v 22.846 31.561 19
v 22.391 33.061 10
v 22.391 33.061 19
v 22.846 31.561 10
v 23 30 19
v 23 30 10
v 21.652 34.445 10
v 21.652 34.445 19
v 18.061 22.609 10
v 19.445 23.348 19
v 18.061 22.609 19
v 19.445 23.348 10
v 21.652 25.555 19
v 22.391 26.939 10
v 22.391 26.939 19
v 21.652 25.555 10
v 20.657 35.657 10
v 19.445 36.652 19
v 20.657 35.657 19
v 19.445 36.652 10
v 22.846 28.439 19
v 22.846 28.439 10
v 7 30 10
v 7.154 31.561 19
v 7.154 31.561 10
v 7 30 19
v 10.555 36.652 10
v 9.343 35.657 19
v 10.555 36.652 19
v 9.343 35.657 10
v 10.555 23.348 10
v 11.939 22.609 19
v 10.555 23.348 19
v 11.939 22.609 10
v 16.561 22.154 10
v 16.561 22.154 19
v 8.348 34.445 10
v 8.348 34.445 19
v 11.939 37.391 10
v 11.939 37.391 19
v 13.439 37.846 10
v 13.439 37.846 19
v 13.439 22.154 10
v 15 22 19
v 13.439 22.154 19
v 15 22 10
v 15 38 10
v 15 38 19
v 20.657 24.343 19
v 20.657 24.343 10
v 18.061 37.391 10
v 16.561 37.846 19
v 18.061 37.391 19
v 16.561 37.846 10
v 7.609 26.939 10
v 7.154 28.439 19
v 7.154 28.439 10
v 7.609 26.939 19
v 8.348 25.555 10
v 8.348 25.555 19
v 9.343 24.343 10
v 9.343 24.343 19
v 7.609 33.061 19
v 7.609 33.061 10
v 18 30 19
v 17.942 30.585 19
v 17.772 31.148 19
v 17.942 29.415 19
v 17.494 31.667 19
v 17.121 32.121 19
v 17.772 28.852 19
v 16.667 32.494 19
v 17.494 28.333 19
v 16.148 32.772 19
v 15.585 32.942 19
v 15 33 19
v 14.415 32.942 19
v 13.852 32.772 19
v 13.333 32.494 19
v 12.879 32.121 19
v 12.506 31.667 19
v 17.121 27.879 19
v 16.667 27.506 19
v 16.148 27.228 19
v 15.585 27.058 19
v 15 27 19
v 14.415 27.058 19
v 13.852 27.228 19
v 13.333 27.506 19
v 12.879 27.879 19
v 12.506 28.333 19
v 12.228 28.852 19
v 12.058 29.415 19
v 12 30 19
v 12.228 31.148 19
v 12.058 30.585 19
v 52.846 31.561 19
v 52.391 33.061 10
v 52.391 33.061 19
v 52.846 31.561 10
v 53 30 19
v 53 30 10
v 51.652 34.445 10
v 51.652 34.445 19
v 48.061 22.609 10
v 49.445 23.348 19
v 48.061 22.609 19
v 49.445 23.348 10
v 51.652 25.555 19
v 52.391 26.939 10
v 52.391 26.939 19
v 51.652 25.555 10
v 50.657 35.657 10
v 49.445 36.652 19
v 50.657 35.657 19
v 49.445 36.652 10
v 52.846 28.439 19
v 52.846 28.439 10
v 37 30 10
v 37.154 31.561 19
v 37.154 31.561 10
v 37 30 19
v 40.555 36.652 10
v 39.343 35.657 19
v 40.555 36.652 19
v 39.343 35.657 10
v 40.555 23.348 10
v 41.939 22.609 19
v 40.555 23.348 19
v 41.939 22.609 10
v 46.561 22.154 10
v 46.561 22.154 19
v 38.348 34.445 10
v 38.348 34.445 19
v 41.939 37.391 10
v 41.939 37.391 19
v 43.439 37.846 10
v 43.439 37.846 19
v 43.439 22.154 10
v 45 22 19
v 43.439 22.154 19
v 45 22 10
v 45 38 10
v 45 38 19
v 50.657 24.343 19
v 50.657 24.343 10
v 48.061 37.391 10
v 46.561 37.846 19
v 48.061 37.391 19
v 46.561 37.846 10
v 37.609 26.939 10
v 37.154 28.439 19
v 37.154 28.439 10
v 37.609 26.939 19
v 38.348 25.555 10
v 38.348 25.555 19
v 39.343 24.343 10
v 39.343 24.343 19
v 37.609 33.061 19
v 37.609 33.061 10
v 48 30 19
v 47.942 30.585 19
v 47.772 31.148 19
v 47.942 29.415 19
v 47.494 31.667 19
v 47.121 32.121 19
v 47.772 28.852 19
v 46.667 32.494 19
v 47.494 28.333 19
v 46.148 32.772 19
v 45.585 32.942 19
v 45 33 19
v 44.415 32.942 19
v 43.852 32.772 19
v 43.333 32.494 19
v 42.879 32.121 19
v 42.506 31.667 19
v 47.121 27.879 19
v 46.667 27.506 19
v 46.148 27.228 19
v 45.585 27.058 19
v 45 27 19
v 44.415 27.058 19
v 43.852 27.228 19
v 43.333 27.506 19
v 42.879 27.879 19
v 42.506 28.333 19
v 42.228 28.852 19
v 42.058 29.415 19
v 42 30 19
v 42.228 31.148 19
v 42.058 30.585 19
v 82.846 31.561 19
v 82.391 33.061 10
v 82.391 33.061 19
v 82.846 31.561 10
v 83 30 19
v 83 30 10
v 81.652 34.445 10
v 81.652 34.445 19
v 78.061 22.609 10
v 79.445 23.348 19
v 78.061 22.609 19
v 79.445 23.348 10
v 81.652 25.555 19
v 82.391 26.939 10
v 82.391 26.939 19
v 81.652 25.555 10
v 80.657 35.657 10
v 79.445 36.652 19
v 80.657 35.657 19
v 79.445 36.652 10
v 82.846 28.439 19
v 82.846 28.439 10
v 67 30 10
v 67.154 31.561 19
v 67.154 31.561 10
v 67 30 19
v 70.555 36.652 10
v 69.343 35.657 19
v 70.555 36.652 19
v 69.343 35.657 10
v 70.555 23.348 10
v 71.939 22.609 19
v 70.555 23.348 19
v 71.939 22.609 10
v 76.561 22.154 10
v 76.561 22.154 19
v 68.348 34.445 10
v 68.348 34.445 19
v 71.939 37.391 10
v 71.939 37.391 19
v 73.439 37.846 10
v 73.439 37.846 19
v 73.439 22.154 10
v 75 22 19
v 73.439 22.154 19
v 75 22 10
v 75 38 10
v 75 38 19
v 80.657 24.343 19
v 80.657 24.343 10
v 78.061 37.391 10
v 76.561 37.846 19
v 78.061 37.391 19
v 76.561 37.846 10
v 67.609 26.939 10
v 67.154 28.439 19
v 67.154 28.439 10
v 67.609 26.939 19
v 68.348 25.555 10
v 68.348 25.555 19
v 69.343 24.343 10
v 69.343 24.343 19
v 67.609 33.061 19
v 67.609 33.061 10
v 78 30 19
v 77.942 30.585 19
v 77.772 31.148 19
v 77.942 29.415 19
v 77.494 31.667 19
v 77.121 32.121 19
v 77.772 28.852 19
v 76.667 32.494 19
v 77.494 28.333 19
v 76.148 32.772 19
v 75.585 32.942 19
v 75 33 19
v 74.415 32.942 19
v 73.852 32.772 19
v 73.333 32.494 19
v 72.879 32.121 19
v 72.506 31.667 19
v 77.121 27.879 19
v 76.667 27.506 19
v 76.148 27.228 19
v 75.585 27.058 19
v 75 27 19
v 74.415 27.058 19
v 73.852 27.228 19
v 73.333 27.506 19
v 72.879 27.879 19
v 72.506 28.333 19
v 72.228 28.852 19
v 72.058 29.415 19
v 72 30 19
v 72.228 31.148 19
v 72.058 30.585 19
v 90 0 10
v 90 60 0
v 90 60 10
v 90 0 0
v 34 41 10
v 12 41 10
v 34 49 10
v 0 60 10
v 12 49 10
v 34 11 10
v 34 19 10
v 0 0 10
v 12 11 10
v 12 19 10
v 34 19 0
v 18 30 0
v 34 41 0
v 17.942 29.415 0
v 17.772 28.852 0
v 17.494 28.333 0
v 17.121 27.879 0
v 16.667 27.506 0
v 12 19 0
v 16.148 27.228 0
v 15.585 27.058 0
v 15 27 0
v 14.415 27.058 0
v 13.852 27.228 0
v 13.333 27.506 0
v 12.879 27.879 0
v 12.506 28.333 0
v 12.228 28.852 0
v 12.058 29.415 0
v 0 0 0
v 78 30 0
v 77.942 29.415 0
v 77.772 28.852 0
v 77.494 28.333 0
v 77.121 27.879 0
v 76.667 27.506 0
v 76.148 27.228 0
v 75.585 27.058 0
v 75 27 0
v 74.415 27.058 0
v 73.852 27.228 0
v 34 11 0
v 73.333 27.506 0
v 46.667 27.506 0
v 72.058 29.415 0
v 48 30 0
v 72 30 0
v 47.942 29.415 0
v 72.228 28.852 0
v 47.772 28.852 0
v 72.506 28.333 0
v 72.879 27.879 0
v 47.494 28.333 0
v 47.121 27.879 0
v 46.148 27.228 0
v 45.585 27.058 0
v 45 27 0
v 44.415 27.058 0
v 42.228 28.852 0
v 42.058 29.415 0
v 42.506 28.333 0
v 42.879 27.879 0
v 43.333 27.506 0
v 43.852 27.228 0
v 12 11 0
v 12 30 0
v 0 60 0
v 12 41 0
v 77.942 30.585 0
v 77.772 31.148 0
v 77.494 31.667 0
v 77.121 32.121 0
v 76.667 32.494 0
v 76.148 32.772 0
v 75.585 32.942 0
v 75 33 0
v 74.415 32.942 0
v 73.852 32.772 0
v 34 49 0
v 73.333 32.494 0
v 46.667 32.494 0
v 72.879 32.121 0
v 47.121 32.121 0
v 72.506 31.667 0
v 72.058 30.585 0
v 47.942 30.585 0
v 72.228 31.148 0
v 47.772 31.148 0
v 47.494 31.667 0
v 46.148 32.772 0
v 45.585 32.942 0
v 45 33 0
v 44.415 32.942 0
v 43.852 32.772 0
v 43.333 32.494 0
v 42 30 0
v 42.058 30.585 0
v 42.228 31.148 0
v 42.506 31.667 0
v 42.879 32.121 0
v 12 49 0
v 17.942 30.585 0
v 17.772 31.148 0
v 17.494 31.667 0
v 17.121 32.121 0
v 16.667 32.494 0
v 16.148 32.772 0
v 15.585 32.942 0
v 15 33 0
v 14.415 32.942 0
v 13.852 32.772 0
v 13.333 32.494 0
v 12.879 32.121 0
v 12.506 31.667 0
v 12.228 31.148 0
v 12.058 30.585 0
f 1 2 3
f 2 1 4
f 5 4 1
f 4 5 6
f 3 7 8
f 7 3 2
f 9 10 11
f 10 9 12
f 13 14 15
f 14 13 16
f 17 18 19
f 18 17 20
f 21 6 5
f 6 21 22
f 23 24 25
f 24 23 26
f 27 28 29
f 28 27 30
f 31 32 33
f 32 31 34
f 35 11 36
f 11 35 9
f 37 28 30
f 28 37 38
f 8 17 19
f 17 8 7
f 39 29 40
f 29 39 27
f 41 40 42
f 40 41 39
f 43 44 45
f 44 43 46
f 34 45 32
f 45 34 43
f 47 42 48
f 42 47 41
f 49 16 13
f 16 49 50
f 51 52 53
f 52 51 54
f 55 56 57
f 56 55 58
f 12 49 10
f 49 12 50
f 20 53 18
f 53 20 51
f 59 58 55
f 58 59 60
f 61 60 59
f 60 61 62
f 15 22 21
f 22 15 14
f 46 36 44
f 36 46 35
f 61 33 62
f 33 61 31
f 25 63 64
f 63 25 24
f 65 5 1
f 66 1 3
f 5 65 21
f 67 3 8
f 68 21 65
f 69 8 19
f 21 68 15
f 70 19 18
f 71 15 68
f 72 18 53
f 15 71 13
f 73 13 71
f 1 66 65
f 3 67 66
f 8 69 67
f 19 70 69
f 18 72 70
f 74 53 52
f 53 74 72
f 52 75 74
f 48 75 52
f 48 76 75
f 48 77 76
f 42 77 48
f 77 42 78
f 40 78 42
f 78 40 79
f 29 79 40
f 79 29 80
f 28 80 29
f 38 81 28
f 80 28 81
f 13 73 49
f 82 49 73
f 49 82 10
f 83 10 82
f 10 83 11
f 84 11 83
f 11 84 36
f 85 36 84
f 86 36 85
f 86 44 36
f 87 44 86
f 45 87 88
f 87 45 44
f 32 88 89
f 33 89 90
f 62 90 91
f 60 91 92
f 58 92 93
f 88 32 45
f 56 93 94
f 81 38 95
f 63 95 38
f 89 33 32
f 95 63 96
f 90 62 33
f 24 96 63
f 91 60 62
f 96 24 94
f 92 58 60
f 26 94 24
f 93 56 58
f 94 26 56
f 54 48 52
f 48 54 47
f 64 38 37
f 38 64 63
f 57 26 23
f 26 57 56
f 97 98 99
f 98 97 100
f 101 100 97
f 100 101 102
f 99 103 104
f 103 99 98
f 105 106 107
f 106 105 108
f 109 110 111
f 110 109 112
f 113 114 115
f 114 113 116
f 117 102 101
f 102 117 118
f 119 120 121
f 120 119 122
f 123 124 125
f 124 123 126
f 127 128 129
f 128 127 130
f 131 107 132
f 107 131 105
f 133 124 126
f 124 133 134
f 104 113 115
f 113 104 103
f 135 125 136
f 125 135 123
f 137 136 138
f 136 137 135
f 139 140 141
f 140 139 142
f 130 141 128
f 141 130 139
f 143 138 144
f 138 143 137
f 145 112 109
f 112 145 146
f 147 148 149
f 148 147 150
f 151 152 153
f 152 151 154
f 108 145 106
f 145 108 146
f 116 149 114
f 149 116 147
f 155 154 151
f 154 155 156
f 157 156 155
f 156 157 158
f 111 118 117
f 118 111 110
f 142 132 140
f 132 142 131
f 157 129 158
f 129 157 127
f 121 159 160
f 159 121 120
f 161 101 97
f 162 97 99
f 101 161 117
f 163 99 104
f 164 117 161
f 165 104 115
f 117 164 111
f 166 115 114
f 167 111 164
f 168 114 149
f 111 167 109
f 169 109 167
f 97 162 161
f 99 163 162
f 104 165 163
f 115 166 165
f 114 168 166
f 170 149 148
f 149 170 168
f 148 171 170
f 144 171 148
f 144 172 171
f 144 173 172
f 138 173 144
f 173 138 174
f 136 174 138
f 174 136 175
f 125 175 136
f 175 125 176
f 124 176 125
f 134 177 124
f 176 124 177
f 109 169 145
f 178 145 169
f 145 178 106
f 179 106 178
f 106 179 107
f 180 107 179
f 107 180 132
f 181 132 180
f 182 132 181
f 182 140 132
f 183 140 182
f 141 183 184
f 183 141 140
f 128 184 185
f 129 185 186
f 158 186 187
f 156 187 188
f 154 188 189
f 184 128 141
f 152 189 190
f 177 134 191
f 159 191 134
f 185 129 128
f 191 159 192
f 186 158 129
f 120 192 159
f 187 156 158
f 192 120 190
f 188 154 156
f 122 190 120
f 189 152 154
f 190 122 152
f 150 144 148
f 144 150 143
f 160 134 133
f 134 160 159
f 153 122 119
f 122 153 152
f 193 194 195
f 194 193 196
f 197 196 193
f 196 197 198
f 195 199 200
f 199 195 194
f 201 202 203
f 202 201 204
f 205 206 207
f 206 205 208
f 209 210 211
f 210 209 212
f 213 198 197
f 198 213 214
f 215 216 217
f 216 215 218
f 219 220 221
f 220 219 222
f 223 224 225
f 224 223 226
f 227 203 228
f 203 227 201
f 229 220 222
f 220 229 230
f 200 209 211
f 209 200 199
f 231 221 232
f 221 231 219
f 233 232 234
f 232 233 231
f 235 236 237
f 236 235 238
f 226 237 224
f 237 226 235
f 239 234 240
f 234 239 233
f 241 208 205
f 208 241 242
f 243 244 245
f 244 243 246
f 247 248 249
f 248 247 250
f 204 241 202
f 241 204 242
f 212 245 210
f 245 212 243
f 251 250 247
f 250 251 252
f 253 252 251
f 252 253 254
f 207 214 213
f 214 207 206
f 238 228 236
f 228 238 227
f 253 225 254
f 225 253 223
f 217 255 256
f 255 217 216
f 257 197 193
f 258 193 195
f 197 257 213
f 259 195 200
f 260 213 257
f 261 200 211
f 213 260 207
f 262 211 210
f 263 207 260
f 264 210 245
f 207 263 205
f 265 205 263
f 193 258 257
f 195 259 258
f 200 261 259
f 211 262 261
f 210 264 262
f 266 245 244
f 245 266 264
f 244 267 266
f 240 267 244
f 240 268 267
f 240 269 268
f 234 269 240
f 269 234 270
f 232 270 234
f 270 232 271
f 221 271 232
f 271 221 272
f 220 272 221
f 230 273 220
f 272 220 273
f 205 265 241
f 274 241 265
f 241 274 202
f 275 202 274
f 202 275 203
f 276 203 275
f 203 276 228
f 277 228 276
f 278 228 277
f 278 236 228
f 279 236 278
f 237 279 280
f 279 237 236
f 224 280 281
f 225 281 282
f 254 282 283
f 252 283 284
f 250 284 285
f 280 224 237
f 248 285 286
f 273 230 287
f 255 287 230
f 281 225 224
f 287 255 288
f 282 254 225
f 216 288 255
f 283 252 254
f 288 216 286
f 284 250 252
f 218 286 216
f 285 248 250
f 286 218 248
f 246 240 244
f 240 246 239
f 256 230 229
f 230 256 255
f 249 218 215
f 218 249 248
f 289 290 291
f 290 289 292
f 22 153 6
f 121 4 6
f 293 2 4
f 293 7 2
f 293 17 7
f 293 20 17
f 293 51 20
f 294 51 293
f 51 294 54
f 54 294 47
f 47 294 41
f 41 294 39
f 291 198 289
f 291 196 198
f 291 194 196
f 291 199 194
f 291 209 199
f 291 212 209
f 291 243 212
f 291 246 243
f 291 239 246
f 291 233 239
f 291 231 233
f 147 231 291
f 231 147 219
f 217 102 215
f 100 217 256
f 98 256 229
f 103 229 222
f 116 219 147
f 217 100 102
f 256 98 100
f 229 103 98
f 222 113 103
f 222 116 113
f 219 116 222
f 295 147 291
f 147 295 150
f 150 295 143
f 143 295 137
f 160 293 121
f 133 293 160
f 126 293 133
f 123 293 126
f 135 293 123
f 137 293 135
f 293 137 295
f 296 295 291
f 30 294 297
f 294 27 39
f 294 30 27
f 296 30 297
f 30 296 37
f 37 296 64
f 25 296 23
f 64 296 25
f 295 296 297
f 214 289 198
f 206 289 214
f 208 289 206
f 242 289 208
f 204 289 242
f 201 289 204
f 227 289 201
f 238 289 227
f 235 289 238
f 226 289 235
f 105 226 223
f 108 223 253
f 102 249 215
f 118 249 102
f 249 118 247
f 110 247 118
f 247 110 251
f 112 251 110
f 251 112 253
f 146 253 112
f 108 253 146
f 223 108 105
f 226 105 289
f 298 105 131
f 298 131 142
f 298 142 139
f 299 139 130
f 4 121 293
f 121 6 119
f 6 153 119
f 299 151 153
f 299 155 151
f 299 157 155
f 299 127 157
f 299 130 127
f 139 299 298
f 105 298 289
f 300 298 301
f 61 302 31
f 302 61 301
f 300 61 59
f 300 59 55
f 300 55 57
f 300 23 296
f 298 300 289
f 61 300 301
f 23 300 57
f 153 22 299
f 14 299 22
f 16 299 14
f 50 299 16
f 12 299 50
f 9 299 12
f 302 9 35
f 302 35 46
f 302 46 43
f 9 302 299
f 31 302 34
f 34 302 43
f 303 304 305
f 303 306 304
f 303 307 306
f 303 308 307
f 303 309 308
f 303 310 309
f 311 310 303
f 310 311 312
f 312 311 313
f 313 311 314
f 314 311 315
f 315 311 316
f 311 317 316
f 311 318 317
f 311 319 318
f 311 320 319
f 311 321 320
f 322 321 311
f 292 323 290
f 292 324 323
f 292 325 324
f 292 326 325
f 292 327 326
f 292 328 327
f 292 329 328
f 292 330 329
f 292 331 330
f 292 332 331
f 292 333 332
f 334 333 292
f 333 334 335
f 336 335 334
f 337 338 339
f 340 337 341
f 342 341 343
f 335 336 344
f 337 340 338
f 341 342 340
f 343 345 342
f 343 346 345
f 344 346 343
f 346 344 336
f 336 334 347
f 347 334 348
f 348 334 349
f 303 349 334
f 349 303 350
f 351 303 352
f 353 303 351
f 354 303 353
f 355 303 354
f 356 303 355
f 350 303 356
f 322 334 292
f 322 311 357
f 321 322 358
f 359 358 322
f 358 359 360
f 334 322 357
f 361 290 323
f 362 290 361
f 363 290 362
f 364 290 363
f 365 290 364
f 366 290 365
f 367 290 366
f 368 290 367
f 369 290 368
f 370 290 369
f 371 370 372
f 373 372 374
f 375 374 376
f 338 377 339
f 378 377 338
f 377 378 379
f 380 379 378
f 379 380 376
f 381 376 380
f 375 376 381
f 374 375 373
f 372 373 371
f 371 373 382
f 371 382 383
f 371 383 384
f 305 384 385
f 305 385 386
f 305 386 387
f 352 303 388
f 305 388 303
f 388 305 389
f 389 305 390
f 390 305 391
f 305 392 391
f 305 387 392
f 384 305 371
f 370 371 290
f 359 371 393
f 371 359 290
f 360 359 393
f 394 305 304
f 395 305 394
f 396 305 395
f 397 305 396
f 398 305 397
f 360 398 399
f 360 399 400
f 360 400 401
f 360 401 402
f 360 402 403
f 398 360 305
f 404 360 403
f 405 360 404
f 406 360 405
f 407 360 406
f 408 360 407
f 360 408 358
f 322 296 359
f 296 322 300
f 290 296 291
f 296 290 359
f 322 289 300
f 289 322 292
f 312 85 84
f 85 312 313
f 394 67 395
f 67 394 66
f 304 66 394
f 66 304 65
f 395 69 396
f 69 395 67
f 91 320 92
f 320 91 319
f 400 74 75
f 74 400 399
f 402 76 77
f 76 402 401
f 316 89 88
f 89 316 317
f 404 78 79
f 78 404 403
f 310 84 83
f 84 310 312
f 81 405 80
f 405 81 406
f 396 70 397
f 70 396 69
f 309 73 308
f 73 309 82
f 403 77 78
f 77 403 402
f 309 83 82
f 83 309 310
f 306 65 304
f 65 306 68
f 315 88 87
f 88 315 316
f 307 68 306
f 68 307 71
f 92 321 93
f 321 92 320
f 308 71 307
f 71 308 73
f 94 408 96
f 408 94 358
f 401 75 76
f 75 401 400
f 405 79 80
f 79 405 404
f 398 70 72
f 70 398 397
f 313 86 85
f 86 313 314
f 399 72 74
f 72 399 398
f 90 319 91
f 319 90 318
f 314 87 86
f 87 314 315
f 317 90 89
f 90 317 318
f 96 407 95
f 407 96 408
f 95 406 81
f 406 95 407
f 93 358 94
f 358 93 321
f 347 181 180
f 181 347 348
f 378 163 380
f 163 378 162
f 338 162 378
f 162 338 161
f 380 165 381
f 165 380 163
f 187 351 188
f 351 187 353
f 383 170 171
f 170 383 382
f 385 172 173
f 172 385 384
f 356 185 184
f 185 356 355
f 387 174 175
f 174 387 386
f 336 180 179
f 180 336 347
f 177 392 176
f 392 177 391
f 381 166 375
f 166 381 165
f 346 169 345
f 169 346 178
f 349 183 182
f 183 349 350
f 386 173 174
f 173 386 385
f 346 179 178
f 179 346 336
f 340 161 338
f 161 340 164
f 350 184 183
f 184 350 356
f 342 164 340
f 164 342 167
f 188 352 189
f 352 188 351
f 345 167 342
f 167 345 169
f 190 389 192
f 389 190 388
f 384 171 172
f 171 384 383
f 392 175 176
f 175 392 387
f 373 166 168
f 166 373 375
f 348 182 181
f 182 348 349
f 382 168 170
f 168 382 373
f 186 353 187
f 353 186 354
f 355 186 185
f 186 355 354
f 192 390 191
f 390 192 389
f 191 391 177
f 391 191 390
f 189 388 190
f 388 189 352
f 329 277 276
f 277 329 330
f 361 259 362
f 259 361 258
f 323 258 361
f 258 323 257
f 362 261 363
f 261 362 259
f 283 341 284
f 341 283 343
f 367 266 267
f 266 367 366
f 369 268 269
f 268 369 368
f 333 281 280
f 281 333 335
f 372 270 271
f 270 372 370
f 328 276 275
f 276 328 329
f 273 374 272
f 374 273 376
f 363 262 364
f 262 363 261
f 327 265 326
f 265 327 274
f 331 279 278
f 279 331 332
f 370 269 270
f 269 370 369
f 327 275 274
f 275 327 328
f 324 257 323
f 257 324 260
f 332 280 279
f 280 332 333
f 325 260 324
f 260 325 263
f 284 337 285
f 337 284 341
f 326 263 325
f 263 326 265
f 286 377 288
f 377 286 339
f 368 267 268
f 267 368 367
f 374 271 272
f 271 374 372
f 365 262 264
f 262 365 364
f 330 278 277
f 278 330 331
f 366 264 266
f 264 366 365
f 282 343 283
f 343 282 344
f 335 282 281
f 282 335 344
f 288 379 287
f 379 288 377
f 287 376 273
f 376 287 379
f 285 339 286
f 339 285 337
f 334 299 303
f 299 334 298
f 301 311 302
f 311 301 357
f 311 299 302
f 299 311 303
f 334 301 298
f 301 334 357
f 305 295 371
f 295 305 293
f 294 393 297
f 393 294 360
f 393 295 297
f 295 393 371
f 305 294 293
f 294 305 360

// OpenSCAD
$fn = 32;

// ----------------------------------------------------------------------
// Drill jig: three_boss_slot jig
// ----------------------------------------------------------------------

// --- parameters (mm) ---
plate_l = 90;             // plate length, X
plate_w = 60;             // plate width, Y
plate_t = 10;             // plate thickness
boss_d = 16;              // guide boss diameter
boss_h = 10;              // boss height above the plate
guide_d = 6;              // guide hole diameter
boss_pitch = 30;          // boss pitch
slot_w = 8;               // clamp slot width
slot_l = 22;              // clamp slot length
slot_x = 12;              // slot start X

n_boss = 3;  // guide bosses
boss_x0 = (plate_l - (n_boss - 1) * boss_pitch) / 2;  // first boss X
boss_top = plate_t - 1 + boss_h;  // boss crown height
total_h = boss_top;  // overall height

difference() {
  union() {
  cube([plate_l, plate_w, plate_t]);
  for (i = [0 : n_boss - 1])
    translate([boss_x0 + i * boss_pitch, plate_w / 2, plate_t - 1])
      cylinder(h = boss_h, d = boss_d);
  }
  for (i = [0 : n_boss - 1])
    translate([boss_x0 + i * boss_pitch, plate_w / 2, -1])
      cylinder(h = plate_t + boss_h, d = guide_d);
  for (cy = [plate_w * 0.25, plate_w * 0.75])
    translate([slot_x, cy - slot_w / 2, -1])
      cube([slot_l, slot_w, plate_t + 2]);
}
